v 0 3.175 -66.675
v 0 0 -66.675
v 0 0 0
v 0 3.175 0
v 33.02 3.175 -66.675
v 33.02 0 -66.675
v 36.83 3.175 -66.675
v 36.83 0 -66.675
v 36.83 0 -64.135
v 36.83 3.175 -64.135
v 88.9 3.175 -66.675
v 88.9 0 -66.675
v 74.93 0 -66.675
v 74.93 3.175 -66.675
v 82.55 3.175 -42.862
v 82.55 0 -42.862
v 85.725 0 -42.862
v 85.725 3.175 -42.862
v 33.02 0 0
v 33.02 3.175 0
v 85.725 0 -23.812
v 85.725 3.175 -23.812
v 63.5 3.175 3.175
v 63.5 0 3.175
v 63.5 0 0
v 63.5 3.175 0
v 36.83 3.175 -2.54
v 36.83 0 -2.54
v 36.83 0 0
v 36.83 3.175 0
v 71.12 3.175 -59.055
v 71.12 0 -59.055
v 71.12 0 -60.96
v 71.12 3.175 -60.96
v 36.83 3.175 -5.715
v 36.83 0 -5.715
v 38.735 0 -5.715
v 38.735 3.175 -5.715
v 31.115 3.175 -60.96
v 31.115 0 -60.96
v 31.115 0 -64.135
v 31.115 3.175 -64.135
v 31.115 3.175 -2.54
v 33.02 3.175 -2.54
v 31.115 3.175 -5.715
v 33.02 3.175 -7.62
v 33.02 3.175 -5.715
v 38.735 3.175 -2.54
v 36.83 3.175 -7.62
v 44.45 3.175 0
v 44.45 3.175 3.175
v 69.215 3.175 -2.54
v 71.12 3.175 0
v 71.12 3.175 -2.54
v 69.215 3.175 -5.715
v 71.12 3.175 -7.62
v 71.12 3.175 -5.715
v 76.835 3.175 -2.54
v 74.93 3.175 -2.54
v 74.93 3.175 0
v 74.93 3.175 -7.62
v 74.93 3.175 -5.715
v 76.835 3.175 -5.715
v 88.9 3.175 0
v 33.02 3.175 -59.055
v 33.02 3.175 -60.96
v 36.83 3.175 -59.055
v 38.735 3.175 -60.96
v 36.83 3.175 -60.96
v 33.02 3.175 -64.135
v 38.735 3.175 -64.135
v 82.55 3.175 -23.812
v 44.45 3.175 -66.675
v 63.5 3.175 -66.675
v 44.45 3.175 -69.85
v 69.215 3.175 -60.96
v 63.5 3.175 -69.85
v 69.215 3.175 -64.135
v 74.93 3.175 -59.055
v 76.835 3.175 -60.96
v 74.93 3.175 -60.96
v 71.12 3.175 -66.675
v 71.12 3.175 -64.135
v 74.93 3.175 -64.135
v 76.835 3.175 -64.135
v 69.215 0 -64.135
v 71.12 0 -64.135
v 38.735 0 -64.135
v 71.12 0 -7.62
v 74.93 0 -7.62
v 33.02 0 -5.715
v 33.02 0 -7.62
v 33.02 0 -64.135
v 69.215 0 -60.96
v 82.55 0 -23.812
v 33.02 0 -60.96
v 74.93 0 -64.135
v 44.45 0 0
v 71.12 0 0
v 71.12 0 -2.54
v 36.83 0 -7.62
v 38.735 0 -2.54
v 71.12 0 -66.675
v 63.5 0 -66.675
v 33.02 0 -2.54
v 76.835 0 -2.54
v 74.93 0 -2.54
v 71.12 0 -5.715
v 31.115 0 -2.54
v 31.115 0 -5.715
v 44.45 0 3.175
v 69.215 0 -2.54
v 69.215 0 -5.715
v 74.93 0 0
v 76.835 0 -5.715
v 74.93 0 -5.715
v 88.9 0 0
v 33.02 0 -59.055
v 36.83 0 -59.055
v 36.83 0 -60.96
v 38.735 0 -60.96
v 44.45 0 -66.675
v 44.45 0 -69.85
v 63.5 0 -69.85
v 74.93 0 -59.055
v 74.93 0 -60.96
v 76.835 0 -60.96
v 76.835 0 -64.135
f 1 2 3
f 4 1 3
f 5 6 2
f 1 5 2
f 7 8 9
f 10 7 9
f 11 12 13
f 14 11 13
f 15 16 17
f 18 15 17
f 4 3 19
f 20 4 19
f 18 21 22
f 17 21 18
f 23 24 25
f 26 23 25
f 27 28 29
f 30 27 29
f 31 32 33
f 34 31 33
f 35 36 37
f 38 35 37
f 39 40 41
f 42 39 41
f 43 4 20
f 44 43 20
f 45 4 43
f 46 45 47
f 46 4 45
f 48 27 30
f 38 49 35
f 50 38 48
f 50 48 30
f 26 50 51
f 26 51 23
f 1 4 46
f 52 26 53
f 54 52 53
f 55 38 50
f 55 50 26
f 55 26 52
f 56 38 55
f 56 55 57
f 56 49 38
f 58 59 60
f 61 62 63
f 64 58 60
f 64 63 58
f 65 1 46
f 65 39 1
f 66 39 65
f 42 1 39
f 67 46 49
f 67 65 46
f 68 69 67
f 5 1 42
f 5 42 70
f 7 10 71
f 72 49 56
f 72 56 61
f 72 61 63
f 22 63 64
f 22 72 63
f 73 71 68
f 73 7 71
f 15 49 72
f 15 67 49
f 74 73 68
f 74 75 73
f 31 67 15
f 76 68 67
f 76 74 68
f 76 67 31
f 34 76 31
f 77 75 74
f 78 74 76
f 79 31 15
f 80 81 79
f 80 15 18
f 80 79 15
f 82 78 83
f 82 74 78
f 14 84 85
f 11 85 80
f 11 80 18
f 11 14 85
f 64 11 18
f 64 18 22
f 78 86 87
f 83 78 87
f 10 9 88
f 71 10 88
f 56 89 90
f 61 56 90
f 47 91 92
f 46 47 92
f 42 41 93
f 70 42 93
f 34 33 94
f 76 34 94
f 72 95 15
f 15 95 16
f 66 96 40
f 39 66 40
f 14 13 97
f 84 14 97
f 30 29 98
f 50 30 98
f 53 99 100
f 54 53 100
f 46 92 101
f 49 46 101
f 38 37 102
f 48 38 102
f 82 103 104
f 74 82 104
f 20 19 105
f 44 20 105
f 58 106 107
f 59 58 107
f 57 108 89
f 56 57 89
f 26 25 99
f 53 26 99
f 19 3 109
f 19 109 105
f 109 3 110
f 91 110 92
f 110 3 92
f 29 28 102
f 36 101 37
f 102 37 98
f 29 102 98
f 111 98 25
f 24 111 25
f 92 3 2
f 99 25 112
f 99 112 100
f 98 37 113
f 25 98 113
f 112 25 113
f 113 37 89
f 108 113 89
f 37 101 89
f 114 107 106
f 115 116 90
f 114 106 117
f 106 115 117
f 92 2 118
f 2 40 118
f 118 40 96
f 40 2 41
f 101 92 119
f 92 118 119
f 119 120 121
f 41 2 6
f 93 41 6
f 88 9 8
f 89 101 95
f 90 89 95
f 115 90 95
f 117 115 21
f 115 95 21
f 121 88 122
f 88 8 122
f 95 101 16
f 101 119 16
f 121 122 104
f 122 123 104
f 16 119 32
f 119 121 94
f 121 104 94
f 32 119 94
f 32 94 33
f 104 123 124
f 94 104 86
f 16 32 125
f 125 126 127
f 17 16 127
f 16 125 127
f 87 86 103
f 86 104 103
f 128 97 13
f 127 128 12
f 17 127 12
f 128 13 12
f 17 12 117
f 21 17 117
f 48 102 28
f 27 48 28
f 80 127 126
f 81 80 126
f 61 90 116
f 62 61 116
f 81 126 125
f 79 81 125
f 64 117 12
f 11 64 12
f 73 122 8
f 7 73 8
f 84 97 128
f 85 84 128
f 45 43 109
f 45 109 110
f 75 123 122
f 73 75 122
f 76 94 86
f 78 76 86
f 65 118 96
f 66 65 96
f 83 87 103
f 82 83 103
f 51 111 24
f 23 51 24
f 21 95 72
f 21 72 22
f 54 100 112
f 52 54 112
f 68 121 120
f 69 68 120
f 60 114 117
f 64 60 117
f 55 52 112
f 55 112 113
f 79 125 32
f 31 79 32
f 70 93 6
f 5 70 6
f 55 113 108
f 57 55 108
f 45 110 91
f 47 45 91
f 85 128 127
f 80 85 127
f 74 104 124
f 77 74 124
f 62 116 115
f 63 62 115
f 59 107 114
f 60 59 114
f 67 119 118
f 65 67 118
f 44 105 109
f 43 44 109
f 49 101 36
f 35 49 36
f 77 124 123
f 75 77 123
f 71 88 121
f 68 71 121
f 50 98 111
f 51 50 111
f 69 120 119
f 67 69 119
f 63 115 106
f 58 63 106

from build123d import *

# Parameters (mm, degrees)
SKETCH1_W           = 3.175
SKETCH1_H           = 19.05
BOSS_EXTRUDE3_DEPTH = 3.175


with BuildPart() as part:
    # Sketch1 → Boss-Extrude3 (new body)
    with BuildSketch(Plane(origin=(0, 0, 0), x_dir=(1, 0, 0), z_dir=(0, 1, 0))):
        Polygon((0, 66.675), (0, 0), (33.02, 0), (33.02, 2.54), (31.115, 2.54), (31.115, 5.715), (33.02, 5.715), (33.02, 7.62), (36.83, 7.62), (36.83, 5.715), (38.735, 5.715), (38.735, 2.54), (36.83, 2.54), (36.83, 0), (44.45, 0), (44.45, -3.175), (63.5, -3.175), (63.5, 0), (71.12, 0), (71.12, 2.54), (69.215, 2.54), (69.215, 5.715), (71.12, 5.715), (71.12, 7.62), (74.93, 7.62), (74.93, 5.715), (76.835, 5.715), (76.835, 2.54), (74.93, 2.54), (74.93, 0), (88.9, 0), (88.9, 66.675), (74.93, 66.675), (74.93, 64.135), (76.835, 64.135), (76.835, 60.96), (74.93, 60.96), (74.93, 59.055), (71.12, 59.055), (71.12, 60.96), (69.215, 60.96), (69.215, 64.135), (71.12, 64.135), (71.12, 66.675), (63.5, 66.675), (63.5, 69.85), (44.45, 69.85), (44.45, 66.675), (36.83, 66.675), (36.83, 64.135), (38.735, 64.135), (38.735, 60.96), (36.83, 60.96), (36.83, 59.055), (33.02, 59.055), (33.02, 60.96), (31.115, 60.96), (31.115, 64.135), (33.02, 64.135), (33.02, 66.675), align=None)
        with Locations((84.1375, 33.3375)):
            Rectangle(SKETCH1_W, SKETCH1_H, mode=Mode.SUBTRACT)
    extrude(amount=BOSS_EXTRUDE3_DEPTH)


solid = part.part
